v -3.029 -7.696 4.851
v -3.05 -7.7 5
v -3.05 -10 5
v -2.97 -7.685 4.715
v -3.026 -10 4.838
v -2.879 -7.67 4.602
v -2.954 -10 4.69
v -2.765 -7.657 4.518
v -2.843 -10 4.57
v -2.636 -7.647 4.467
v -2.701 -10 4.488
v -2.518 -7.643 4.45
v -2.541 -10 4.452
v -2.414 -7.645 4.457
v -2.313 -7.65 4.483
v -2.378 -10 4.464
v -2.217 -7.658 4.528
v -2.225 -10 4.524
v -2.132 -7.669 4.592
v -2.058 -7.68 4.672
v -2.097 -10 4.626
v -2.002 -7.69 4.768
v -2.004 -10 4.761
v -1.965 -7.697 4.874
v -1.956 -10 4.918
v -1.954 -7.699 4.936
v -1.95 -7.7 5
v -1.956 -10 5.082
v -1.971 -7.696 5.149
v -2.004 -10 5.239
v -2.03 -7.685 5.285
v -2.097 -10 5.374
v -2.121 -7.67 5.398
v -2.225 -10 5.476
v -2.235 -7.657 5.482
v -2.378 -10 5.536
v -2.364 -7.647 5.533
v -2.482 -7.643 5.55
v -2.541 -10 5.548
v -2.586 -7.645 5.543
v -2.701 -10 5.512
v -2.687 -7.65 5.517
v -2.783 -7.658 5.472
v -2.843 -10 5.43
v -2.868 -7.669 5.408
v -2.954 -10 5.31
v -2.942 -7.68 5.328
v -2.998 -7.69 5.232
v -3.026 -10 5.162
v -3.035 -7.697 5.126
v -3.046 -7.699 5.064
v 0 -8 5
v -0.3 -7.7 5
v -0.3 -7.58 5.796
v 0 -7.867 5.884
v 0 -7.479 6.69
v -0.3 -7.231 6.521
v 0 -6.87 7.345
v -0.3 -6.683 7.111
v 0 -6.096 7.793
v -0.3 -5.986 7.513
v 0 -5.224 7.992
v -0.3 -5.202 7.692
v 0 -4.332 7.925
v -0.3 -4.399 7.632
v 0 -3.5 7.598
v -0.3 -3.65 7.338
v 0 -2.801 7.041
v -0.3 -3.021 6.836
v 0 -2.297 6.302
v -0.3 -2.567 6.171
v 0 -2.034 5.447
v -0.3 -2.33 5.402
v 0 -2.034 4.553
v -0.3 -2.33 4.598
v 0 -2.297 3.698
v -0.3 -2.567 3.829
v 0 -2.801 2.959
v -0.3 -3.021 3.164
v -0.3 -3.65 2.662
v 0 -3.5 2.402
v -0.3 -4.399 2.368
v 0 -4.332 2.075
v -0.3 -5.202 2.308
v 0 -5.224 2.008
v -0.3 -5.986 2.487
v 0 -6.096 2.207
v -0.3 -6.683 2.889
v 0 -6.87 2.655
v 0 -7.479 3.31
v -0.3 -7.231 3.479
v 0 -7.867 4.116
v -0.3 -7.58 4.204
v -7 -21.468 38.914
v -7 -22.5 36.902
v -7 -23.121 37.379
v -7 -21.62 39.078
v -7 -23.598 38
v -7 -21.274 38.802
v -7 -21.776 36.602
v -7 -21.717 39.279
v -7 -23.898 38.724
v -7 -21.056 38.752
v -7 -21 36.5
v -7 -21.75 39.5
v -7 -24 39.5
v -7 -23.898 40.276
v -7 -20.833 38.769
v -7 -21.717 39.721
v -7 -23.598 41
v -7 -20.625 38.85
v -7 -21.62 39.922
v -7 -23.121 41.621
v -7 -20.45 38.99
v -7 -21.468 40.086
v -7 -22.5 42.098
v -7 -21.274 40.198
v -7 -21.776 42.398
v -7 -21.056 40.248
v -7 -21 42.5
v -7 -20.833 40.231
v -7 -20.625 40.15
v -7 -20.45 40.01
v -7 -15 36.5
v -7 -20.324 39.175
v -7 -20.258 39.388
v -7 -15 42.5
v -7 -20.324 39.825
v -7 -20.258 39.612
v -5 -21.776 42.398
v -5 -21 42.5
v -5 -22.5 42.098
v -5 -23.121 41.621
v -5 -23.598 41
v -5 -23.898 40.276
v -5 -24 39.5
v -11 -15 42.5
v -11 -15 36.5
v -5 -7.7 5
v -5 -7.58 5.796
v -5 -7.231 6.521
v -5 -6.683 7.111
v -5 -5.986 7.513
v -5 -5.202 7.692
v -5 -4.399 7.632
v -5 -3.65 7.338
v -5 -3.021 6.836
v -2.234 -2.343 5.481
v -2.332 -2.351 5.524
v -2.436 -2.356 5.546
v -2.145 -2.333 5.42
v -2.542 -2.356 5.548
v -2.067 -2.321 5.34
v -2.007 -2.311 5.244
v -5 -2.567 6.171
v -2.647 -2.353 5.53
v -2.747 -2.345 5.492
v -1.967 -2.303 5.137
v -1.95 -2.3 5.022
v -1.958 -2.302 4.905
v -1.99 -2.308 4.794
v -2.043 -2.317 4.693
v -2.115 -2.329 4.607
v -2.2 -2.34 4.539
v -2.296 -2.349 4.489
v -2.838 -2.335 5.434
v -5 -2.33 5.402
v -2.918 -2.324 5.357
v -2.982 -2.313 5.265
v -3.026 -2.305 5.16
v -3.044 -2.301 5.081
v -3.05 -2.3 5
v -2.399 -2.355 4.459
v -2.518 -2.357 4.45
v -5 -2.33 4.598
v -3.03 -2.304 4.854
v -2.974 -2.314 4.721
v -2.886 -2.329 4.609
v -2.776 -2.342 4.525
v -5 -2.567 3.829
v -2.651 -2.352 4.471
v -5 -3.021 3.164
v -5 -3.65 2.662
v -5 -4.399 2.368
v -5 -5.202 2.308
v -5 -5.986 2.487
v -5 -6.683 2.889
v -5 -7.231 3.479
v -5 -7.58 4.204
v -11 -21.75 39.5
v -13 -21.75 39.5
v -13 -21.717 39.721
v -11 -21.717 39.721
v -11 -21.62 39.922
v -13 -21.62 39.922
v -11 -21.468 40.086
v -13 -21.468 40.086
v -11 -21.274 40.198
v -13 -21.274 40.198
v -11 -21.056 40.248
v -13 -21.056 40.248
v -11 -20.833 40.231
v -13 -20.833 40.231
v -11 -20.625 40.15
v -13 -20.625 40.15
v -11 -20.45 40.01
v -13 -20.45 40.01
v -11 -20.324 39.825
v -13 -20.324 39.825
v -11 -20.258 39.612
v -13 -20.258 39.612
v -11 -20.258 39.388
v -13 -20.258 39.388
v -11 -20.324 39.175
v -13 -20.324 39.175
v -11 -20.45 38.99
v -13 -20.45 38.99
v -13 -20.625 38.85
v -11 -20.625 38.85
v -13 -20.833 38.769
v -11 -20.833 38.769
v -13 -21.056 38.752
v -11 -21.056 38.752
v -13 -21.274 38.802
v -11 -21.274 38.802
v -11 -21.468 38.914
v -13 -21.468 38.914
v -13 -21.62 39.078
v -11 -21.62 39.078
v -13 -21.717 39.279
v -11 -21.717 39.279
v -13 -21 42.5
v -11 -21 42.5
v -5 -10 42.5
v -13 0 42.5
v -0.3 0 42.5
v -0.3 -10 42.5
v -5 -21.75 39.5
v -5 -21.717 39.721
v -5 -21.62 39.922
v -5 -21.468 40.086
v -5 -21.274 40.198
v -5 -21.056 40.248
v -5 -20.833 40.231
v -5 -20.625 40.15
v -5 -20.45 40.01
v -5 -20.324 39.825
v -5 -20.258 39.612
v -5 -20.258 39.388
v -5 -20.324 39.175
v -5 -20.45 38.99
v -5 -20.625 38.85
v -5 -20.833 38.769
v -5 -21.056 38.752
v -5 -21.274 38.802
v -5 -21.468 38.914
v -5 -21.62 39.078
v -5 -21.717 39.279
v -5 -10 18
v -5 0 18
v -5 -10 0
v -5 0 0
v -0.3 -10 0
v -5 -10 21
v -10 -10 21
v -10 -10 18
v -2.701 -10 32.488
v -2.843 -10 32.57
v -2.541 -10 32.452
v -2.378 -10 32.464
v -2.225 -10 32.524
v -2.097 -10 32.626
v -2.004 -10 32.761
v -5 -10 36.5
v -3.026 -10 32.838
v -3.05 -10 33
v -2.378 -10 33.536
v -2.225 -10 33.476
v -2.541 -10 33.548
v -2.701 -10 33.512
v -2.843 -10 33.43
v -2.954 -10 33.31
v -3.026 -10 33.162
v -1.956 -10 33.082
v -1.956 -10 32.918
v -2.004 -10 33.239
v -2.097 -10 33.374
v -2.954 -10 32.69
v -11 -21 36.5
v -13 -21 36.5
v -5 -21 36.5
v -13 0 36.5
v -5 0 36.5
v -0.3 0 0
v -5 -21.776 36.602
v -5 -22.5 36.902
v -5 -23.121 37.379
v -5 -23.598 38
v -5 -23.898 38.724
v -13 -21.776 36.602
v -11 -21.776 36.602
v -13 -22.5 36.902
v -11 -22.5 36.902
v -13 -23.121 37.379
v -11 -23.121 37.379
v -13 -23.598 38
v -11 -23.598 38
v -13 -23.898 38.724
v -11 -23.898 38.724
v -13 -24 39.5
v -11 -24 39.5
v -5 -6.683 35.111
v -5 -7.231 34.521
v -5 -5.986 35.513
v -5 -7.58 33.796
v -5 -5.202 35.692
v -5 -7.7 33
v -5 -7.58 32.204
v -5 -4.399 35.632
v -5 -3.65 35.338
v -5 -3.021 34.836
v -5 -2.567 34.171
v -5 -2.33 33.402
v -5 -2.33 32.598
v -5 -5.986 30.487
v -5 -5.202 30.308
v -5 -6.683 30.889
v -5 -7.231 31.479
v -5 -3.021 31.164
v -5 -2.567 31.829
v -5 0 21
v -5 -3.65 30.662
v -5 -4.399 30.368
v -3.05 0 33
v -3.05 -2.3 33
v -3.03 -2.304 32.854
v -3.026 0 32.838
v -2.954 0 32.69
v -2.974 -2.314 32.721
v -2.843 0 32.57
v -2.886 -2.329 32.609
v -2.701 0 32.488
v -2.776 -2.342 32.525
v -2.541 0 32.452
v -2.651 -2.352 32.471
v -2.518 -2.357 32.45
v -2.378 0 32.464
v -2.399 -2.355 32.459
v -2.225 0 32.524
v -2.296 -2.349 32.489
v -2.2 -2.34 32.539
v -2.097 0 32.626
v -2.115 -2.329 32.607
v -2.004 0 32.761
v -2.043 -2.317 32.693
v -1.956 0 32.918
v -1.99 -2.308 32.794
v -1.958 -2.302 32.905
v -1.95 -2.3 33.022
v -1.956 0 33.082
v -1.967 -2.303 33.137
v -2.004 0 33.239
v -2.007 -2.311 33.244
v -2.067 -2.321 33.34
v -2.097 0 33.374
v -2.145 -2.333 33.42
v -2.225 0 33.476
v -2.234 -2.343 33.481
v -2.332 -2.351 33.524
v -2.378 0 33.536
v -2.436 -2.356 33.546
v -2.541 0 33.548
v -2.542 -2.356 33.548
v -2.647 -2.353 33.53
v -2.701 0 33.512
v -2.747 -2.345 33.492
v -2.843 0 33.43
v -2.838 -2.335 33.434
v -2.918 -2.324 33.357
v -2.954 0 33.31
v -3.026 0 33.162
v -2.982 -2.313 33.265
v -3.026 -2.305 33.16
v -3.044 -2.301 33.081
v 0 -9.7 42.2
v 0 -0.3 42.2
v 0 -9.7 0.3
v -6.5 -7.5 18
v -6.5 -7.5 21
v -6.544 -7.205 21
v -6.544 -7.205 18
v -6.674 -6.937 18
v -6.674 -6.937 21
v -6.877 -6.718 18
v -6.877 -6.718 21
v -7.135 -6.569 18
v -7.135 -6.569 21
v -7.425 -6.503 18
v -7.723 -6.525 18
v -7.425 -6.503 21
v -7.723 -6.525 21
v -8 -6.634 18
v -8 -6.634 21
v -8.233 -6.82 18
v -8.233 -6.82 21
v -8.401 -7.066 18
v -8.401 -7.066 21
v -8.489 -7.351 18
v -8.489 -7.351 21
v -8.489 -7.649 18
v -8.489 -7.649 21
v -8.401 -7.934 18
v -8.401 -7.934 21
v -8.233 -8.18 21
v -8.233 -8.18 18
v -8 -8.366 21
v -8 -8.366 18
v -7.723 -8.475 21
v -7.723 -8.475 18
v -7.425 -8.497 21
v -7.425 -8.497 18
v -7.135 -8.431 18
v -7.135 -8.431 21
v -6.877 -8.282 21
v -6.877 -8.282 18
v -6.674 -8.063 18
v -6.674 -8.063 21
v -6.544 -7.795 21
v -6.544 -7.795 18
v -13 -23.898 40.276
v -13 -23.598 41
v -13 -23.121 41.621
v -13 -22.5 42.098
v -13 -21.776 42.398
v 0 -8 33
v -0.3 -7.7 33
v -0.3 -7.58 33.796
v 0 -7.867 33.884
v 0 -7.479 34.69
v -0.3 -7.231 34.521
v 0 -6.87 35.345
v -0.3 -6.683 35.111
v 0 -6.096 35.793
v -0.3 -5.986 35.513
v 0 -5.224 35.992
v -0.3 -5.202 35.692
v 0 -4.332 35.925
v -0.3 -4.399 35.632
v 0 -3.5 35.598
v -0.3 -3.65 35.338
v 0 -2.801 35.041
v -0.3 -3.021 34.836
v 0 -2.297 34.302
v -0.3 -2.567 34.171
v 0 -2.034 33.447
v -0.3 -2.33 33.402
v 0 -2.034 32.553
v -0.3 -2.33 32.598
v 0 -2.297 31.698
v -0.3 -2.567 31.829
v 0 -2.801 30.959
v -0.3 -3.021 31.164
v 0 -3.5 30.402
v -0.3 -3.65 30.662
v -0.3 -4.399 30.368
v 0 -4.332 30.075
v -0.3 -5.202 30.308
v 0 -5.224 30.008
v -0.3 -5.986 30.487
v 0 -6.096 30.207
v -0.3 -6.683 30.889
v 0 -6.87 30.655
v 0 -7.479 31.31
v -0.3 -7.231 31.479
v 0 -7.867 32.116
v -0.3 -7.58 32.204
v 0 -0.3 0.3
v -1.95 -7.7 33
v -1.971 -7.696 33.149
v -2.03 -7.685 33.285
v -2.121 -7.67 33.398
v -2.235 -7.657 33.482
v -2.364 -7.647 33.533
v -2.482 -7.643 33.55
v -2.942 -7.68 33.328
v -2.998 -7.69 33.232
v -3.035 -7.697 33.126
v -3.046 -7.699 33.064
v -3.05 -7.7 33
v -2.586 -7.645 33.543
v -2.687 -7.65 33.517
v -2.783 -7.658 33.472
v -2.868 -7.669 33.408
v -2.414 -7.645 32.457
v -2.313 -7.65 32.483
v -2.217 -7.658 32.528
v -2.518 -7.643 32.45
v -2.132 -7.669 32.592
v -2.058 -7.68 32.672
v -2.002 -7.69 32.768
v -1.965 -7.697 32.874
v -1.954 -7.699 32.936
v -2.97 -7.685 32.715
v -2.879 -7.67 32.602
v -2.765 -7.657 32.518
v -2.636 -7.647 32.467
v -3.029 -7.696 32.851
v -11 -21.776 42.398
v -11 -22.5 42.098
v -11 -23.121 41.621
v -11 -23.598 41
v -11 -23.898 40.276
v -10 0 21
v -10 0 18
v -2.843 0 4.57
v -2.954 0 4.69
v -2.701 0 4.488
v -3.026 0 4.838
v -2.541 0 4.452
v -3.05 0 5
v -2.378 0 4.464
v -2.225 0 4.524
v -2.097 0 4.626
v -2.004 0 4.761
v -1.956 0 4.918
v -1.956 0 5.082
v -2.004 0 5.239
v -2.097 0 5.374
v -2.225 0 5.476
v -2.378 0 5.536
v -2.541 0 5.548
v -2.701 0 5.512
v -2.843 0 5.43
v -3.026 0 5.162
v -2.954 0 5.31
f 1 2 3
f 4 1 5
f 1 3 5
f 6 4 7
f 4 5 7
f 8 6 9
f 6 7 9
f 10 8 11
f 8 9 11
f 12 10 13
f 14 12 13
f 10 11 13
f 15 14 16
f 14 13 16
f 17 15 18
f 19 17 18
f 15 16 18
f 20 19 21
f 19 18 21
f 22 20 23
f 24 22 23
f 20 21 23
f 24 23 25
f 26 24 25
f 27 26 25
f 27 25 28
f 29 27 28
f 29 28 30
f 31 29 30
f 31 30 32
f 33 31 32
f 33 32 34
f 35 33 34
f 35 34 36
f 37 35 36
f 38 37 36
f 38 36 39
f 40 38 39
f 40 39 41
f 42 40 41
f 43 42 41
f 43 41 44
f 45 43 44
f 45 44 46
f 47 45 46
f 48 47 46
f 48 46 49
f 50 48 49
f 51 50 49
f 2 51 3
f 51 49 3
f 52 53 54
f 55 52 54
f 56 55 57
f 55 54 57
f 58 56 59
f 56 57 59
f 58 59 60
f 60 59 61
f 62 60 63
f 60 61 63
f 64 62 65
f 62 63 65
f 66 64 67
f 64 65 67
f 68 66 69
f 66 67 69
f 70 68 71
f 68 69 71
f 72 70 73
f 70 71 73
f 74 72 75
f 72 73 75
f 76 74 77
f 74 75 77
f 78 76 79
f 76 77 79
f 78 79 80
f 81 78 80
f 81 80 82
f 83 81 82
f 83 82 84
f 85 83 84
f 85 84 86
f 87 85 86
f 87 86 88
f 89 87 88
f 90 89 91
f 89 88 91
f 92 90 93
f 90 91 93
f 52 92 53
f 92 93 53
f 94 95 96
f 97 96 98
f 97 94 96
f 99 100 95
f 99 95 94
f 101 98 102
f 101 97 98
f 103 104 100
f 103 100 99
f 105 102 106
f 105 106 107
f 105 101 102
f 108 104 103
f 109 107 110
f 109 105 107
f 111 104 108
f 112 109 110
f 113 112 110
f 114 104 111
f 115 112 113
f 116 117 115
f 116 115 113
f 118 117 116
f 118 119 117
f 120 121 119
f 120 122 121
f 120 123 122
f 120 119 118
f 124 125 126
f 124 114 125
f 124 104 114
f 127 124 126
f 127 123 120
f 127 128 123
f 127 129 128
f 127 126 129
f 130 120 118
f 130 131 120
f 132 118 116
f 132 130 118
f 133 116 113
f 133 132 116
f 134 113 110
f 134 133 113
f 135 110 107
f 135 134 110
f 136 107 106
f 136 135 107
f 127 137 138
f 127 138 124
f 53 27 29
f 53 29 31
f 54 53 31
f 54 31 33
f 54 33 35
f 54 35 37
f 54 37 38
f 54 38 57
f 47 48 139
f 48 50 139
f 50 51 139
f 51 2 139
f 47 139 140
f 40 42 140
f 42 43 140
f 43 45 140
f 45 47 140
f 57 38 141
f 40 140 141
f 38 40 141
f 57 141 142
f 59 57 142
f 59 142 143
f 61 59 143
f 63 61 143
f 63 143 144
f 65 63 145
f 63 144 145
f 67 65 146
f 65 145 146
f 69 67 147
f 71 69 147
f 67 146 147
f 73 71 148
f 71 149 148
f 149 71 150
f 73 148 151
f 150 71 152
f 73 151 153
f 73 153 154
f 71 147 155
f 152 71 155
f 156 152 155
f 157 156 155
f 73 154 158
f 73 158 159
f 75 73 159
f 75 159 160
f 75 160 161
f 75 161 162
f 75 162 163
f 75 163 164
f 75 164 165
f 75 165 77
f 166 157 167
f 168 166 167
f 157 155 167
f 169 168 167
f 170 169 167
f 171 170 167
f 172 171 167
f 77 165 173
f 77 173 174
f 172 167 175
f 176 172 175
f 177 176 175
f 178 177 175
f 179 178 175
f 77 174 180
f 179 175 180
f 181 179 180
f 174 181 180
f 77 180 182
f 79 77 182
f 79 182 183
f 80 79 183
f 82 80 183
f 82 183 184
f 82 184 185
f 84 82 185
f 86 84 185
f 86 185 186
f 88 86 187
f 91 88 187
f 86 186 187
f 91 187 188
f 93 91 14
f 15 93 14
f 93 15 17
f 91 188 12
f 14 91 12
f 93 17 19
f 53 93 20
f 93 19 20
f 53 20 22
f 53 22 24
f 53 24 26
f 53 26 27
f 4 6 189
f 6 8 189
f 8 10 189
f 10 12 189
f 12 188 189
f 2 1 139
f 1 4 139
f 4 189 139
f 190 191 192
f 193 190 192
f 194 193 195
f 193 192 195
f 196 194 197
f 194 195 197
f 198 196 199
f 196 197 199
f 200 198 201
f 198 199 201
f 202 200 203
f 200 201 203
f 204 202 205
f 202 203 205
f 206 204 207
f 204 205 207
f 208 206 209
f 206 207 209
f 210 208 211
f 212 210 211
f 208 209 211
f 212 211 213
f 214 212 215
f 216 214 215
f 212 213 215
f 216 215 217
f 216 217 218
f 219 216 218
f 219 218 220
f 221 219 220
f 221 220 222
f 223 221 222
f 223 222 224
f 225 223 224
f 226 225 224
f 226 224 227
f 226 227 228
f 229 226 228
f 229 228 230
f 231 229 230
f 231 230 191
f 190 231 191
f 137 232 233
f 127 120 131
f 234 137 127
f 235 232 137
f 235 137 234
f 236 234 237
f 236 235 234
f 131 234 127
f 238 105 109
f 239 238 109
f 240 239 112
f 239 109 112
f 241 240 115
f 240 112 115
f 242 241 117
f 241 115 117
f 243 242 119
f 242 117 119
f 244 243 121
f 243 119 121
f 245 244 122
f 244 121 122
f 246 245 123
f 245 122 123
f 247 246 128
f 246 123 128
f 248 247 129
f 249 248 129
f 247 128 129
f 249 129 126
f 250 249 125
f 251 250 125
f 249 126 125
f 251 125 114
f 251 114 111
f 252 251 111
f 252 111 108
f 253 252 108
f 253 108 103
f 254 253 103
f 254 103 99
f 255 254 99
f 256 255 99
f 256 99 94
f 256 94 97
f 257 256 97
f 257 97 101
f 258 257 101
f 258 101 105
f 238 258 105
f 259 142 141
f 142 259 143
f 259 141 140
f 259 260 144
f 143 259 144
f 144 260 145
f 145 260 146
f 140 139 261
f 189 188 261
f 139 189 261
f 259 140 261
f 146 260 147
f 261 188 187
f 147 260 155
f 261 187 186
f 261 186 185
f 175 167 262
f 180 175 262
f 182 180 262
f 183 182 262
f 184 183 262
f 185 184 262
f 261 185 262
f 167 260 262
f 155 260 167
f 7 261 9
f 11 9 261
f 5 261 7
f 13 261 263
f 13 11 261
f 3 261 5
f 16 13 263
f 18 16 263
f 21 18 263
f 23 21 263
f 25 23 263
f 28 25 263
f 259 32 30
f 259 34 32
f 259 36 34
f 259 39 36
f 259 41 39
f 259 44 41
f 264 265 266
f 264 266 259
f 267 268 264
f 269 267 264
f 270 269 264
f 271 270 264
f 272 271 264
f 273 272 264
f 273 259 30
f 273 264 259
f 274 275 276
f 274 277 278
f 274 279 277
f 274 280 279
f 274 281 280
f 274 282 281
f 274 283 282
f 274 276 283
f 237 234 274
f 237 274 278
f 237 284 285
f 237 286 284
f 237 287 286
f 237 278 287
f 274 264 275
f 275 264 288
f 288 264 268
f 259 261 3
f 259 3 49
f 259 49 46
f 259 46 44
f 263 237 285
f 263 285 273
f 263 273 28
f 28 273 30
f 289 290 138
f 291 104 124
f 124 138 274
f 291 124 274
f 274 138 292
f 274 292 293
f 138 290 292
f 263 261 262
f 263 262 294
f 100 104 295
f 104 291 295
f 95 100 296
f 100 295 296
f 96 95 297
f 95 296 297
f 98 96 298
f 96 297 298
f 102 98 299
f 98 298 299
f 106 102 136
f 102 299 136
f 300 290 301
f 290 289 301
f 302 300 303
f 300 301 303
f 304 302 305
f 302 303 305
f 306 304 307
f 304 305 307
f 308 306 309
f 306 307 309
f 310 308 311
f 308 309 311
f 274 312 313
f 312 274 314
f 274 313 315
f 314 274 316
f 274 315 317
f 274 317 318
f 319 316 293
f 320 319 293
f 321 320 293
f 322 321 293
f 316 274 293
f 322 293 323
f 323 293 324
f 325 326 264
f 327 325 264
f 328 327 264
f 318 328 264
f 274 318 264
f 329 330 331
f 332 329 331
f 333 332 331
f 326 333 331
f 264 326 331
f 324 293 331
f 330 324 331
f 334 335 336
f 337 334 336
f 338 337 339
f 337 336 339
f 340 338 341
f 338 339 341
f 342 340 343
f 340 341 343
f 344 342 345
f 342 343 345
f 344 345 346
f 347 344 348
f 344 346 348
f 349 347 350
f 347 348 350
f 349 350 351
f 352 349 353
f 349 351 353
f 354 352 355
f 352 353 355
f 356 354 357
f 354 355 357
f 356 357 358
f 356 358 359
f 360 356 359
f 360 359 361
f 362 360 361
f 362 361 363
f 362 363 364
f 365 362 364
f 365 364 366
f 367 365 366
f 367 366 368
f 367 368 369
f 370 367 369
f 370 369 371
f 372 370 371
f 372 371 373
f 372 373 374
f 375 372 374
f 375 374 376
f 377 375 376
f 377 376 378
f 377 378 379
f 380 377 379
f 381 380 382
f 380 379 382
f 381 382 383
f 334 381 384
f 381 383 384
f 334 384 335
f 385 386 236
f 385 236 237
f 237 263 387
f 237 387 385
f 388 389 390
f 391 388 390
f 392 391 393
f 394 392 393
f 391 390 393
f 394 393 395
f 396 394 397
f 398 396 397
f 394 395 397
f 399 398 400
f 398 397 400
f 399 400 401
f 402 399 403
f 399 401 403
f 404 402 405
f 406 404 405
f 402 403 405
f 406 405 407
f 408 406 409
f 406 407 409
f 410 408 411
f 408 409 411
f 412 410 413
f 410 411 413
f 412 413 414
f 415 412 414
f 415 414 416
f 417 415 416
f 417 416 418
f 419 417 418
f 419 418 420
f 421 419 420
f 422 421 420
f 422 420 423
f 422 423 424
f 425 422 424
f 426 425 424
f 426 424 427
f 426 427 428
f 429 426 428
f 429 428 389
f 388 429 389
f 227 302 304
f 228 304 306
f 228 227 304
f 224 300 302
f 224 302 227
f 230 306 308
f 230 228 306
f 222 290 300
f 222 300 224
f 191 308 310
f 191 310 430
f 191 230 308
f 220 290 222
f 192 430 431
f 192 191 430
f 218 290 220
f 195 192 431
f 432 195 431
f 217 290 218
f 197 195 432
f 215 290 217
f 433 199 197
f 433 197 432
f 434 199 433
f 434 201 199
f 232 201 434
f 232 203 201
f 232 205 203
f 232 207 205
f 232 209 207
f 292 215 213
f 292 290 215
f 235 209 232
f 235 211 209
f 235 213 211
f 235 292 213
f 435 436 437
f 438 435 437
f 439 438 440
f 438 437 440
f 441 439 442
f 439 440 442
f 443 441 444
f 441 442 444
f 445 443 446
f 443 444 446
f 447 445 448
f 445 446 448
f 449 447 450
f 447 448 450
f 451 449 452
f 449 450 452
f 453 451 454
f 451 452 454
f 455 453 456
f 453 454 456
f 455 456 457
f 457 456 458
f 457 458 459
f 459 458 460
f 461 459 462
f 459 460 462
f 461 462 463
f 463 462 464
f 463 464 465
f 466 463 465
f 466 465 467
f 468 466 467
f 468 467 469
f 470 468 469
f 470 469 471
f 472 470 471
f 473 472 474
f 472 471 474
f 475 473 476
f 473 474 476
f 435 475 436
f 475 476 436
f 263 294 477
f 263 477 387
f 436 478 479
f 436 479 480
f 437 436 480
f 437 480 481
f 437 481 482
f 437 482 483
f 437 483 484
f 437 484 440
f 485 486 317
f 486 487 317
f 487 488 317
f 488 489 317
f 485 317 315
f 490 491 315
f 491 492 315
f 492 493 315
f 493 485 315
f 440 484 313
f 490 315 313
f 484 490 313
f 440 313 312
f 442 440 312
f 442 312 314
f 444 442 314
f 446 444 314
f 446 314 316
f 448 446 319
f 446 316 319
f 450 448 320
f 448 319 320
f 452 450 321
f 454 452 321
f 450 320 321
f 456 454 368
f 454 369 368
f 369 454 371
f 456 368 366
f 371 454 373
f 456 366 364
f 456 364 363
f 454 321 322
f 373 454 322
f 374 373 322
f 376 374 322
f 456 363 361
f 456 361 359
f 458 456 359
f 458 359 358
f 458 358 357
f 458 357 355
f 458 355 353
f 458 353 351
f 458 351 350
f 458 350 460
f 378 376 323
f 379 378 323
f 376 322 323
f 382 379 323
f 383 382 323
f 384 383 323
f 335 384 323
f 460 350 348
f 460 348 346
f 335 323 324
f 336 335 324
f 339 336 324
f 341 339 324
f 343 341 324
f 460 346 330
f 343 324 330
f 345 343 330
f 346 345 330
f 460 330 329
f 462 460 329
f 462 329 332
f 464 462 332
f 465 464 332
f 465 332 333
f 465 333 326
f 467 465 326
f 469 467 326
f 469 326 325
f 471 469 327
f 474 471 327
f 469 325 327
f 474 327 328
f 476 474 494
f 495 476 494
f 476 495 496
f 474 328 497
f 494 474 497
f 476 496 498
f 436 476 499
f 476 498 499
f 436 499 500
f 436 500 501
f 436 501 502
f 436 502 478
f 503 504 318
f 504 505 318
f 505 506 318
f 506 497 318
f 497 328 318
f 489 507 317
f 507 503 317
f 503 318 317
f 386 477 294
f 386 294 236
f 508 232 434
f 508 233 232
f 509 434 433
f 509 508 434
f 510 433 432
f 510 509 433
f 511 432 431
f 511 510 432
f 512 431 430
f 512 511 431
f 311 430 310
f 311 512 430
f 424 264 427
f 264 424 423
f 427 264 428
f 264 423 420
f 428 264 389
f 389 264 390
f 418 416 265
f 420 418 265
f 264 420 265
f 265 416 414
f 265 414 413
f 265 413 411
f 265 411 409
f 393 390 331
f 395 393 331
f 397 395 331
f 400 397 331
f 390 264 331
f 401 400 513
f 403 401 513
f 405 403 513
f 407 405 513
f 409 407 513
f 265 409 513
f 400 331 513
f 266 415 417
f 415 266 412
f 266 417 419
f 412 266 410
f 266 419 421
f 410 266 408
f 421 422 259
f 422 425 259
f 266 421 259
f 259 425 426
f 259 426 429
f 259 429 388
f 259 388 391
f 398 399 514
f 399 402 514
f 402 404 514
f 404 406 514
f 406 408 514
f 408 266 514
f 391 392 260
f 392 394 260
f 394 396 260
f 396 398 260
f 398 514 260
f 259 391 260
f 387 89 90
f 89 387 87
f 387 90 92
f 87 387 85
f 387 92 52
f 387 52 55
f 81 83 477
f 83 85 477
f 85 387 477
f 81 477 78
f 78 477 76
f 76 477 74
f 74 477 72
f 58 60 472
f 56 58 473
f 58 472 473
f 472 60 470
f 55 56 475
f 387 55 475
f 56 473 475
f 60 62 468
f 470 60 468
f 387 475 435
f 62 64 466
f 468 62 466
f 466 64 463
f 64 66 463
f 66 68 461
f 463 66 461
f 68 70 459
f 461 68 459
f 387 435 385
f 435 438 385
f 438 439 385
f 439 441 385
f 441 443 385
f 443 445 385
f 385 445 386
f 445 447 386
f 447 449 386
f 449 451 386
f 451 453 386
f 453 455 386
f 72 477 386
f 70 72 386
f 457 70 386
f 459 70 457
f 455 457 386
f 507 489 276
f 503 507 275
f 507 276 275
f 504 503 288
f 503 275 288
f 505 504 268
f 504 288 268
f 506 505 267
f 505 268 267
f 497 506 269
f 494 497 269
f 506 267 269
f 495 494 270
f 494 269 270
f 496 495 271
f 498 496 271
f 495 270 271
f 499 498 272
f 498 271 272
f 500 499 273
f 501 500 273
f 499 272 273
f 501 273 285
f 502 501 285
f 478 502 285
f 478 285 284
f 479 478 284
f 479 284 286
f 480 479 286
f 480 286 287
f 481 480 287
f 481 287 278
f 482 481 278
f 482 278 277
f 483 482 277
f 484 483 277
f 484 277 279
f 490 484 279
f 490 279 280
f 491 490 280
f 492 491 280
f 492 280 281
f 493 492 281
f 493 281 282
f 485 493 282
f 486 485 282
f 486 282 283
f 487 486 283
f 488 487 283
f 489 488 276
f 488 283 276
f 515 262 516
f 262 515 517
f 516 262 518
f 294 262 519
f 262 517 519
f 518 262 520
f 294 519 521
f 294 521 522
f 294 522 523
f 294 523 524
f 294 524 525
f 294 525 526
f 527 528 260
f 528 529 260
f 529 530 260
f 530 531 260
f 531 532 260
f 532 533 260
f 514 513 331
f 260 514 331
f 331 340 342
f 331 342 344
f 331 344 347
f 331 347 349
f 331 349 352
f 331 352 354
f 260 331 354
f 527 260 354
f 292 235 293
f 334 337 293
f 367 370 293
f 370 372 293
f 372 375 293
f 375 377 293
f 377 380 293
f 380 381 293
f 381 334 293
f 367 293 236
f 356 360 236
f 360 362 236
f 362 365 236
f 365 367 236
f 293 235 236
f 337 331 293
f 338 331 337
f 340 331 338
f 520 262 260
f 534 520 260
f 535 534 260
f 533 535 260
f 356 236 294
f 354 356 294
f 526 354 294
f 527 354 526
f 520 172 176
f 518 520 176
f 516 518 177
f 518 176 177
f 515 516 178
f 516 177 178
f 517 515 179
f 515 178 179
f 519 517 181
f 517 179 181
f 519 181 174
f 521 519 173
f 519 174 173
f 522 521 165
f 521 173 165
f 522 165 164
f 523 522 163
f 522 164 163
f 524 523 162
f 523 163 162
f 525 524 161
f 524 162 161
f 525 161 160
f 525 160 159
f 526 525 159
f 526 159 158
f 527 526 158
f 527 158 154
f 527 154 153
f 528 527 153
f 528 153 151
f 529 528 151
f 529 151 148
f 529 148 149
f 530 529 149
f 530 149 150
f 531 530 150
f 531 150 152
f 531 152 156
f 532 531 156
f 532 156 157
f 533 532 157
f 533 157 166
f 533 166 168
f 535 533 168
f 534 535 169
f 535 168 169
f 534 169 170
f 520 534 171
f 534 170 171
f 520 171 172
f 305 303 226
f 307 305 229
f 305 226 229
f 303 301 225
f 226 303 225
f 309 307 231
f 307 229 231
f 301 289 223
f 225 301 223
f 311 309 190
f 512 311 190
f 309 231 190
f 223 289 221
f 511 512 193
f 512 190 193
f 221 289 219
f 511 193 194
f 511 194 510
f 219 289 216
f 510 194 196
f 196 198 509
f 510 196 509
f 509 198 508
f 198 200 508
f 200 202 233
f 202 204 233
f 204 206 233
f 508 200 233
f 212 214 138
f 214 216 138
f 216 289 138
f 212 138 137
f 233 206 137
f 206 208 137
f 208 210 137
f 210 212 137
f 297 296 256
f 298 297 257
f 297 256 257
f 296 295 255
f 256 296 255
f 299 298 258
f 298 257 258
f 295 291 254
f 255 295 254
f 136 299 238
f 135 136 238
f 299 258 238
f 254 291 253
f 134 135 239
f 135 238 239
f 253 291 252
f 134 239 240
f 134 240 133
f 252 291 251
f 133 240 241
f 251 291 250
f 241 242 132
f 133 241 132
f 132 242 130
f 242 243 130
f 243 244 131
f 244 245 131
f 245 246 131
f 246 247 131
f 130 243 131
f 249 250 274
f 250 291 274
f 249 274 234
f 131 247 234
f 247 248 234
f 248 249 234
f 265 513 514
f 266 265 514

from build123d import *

# Parameters (mm, degrees)
F0_W     = 4
F0_H     = 6
F1_DEPTH = 15
F0_W_2   = 2
F2_DEPTH = 24
F0_W_3   = 5
F3_DEPTH = 10
F4_R     = 2.99999
F5_R     = 2.7
F5_R_2   = 0.75
F6_DEPTH = 13.001
F7_D     = 1.1
F7_DEPTH = 40
F7_TIP   = 0.3304733405
F8_R     = 1
F9_DEPTH = 21.001
F10_SIZE = 0.3


# Not quite as in the source:
# - a fillet or chamfer is up to 0.001 mm smaller than in the source, because OpenCascade refuses the exact size


with BuildPart() as f1:
    # F0 (on Front) → F1 (new body)
    with BuildSketch(Plane.XZ):
        with Locations((-9, 39.5)):
            Rectangle(F0_W, F0_H)
    extrude(amount=F1_DEPTH)

    # F0 (on Front) → F2 (join)
    with BuildSketch(Plane.XZ):
        with Locations((-12, 39.5)):
            Rectangle(F0_W_2, F0_H)
        with Locations((-6, 39.5)):
            Rectangle(F0_W_2, F0_H)
    extrude(amount=F2_DEPTH)

    # F0 (on Front) → F3 (join)
    with BuildSketch(Plane.XZ):
        with Locations((-2.5, 39.5)):
            Rectangle(F0_W_3, F0_H)
        Polygon((0, 36.5), (-5, 36.5), (-5, 21), (-10, 21), (-10, 18), (-5, 18), (-5, 0), (0, 0), align=None)
    extrude(amount=F3_DEPTH)

    # F4 (radius 3 in the source; OpenCascade refuses exactly that, so slightly less here)
    f4_edges = [f1.edges().sort_by_distance(p)[0] for p in [
        (-6, -24, 42.5),
        (-6, -24, 36.5),
        (-12, -24, 42.5),
        (-12, -24, 36.5),
    ]]
    fillet(f4_edges, radius=F4_R)

    # F5 (on face) → F6 (cut, through all)
    with BuildSketch(Plane(origin=(-13, 0, 0), x_dir=(0, -1, 0), z_dir=(-1, 0, 0))):
        with Locations((5, 33)):
            Circle(F5_R)
        with Locations((5, 5)):
            Circle(F5_R)
        with Locations((21, 39.5)):
            Circle(F5_R_2)
    extrude(amount=-F6_DEPTH, mode=Mode.SUBTRACT)

    # F7
    with Locations(Plane(origin=(0, 0, 0), x_dir=(1, 0, 0), z_dir=(0, 1, 0))):
        with Locations((-2.5, -33), (-2.5, -5)):
            Hole(F7_D / 2, depth=F7_DEPTH)
            with Locations((0, 0, -(F7_DEPTH + F7_TIP / 2))):  # 118° drill point
                Cone(0, F7_D / 2, F7_TIP, mode=Mode.SUBTRACT)

    # F8 (on face) → F9 (cut, through all)
    with BuildSketch(Plane.XY.offset(21)):
        with Locations((-7.5, -7.5)):
            Circle(F8_R)
    extrude(amount=-F9_DEPTH, mode=Mode.SUBTRACT)

    # F10
    f10_edges = [f1.edges().sort_by_distance(p)[0] for p in [
        (0, -5, 0),
        (0, 0, 21.25),
        (0, -10, 21.25),
        (0, -5, 42.5),
        (0, -2.3, 5),
        (0, -2.3, 33),
    ]]
    chamfer(f10_edges, length=F10_SIZE)


solid = f1.part
